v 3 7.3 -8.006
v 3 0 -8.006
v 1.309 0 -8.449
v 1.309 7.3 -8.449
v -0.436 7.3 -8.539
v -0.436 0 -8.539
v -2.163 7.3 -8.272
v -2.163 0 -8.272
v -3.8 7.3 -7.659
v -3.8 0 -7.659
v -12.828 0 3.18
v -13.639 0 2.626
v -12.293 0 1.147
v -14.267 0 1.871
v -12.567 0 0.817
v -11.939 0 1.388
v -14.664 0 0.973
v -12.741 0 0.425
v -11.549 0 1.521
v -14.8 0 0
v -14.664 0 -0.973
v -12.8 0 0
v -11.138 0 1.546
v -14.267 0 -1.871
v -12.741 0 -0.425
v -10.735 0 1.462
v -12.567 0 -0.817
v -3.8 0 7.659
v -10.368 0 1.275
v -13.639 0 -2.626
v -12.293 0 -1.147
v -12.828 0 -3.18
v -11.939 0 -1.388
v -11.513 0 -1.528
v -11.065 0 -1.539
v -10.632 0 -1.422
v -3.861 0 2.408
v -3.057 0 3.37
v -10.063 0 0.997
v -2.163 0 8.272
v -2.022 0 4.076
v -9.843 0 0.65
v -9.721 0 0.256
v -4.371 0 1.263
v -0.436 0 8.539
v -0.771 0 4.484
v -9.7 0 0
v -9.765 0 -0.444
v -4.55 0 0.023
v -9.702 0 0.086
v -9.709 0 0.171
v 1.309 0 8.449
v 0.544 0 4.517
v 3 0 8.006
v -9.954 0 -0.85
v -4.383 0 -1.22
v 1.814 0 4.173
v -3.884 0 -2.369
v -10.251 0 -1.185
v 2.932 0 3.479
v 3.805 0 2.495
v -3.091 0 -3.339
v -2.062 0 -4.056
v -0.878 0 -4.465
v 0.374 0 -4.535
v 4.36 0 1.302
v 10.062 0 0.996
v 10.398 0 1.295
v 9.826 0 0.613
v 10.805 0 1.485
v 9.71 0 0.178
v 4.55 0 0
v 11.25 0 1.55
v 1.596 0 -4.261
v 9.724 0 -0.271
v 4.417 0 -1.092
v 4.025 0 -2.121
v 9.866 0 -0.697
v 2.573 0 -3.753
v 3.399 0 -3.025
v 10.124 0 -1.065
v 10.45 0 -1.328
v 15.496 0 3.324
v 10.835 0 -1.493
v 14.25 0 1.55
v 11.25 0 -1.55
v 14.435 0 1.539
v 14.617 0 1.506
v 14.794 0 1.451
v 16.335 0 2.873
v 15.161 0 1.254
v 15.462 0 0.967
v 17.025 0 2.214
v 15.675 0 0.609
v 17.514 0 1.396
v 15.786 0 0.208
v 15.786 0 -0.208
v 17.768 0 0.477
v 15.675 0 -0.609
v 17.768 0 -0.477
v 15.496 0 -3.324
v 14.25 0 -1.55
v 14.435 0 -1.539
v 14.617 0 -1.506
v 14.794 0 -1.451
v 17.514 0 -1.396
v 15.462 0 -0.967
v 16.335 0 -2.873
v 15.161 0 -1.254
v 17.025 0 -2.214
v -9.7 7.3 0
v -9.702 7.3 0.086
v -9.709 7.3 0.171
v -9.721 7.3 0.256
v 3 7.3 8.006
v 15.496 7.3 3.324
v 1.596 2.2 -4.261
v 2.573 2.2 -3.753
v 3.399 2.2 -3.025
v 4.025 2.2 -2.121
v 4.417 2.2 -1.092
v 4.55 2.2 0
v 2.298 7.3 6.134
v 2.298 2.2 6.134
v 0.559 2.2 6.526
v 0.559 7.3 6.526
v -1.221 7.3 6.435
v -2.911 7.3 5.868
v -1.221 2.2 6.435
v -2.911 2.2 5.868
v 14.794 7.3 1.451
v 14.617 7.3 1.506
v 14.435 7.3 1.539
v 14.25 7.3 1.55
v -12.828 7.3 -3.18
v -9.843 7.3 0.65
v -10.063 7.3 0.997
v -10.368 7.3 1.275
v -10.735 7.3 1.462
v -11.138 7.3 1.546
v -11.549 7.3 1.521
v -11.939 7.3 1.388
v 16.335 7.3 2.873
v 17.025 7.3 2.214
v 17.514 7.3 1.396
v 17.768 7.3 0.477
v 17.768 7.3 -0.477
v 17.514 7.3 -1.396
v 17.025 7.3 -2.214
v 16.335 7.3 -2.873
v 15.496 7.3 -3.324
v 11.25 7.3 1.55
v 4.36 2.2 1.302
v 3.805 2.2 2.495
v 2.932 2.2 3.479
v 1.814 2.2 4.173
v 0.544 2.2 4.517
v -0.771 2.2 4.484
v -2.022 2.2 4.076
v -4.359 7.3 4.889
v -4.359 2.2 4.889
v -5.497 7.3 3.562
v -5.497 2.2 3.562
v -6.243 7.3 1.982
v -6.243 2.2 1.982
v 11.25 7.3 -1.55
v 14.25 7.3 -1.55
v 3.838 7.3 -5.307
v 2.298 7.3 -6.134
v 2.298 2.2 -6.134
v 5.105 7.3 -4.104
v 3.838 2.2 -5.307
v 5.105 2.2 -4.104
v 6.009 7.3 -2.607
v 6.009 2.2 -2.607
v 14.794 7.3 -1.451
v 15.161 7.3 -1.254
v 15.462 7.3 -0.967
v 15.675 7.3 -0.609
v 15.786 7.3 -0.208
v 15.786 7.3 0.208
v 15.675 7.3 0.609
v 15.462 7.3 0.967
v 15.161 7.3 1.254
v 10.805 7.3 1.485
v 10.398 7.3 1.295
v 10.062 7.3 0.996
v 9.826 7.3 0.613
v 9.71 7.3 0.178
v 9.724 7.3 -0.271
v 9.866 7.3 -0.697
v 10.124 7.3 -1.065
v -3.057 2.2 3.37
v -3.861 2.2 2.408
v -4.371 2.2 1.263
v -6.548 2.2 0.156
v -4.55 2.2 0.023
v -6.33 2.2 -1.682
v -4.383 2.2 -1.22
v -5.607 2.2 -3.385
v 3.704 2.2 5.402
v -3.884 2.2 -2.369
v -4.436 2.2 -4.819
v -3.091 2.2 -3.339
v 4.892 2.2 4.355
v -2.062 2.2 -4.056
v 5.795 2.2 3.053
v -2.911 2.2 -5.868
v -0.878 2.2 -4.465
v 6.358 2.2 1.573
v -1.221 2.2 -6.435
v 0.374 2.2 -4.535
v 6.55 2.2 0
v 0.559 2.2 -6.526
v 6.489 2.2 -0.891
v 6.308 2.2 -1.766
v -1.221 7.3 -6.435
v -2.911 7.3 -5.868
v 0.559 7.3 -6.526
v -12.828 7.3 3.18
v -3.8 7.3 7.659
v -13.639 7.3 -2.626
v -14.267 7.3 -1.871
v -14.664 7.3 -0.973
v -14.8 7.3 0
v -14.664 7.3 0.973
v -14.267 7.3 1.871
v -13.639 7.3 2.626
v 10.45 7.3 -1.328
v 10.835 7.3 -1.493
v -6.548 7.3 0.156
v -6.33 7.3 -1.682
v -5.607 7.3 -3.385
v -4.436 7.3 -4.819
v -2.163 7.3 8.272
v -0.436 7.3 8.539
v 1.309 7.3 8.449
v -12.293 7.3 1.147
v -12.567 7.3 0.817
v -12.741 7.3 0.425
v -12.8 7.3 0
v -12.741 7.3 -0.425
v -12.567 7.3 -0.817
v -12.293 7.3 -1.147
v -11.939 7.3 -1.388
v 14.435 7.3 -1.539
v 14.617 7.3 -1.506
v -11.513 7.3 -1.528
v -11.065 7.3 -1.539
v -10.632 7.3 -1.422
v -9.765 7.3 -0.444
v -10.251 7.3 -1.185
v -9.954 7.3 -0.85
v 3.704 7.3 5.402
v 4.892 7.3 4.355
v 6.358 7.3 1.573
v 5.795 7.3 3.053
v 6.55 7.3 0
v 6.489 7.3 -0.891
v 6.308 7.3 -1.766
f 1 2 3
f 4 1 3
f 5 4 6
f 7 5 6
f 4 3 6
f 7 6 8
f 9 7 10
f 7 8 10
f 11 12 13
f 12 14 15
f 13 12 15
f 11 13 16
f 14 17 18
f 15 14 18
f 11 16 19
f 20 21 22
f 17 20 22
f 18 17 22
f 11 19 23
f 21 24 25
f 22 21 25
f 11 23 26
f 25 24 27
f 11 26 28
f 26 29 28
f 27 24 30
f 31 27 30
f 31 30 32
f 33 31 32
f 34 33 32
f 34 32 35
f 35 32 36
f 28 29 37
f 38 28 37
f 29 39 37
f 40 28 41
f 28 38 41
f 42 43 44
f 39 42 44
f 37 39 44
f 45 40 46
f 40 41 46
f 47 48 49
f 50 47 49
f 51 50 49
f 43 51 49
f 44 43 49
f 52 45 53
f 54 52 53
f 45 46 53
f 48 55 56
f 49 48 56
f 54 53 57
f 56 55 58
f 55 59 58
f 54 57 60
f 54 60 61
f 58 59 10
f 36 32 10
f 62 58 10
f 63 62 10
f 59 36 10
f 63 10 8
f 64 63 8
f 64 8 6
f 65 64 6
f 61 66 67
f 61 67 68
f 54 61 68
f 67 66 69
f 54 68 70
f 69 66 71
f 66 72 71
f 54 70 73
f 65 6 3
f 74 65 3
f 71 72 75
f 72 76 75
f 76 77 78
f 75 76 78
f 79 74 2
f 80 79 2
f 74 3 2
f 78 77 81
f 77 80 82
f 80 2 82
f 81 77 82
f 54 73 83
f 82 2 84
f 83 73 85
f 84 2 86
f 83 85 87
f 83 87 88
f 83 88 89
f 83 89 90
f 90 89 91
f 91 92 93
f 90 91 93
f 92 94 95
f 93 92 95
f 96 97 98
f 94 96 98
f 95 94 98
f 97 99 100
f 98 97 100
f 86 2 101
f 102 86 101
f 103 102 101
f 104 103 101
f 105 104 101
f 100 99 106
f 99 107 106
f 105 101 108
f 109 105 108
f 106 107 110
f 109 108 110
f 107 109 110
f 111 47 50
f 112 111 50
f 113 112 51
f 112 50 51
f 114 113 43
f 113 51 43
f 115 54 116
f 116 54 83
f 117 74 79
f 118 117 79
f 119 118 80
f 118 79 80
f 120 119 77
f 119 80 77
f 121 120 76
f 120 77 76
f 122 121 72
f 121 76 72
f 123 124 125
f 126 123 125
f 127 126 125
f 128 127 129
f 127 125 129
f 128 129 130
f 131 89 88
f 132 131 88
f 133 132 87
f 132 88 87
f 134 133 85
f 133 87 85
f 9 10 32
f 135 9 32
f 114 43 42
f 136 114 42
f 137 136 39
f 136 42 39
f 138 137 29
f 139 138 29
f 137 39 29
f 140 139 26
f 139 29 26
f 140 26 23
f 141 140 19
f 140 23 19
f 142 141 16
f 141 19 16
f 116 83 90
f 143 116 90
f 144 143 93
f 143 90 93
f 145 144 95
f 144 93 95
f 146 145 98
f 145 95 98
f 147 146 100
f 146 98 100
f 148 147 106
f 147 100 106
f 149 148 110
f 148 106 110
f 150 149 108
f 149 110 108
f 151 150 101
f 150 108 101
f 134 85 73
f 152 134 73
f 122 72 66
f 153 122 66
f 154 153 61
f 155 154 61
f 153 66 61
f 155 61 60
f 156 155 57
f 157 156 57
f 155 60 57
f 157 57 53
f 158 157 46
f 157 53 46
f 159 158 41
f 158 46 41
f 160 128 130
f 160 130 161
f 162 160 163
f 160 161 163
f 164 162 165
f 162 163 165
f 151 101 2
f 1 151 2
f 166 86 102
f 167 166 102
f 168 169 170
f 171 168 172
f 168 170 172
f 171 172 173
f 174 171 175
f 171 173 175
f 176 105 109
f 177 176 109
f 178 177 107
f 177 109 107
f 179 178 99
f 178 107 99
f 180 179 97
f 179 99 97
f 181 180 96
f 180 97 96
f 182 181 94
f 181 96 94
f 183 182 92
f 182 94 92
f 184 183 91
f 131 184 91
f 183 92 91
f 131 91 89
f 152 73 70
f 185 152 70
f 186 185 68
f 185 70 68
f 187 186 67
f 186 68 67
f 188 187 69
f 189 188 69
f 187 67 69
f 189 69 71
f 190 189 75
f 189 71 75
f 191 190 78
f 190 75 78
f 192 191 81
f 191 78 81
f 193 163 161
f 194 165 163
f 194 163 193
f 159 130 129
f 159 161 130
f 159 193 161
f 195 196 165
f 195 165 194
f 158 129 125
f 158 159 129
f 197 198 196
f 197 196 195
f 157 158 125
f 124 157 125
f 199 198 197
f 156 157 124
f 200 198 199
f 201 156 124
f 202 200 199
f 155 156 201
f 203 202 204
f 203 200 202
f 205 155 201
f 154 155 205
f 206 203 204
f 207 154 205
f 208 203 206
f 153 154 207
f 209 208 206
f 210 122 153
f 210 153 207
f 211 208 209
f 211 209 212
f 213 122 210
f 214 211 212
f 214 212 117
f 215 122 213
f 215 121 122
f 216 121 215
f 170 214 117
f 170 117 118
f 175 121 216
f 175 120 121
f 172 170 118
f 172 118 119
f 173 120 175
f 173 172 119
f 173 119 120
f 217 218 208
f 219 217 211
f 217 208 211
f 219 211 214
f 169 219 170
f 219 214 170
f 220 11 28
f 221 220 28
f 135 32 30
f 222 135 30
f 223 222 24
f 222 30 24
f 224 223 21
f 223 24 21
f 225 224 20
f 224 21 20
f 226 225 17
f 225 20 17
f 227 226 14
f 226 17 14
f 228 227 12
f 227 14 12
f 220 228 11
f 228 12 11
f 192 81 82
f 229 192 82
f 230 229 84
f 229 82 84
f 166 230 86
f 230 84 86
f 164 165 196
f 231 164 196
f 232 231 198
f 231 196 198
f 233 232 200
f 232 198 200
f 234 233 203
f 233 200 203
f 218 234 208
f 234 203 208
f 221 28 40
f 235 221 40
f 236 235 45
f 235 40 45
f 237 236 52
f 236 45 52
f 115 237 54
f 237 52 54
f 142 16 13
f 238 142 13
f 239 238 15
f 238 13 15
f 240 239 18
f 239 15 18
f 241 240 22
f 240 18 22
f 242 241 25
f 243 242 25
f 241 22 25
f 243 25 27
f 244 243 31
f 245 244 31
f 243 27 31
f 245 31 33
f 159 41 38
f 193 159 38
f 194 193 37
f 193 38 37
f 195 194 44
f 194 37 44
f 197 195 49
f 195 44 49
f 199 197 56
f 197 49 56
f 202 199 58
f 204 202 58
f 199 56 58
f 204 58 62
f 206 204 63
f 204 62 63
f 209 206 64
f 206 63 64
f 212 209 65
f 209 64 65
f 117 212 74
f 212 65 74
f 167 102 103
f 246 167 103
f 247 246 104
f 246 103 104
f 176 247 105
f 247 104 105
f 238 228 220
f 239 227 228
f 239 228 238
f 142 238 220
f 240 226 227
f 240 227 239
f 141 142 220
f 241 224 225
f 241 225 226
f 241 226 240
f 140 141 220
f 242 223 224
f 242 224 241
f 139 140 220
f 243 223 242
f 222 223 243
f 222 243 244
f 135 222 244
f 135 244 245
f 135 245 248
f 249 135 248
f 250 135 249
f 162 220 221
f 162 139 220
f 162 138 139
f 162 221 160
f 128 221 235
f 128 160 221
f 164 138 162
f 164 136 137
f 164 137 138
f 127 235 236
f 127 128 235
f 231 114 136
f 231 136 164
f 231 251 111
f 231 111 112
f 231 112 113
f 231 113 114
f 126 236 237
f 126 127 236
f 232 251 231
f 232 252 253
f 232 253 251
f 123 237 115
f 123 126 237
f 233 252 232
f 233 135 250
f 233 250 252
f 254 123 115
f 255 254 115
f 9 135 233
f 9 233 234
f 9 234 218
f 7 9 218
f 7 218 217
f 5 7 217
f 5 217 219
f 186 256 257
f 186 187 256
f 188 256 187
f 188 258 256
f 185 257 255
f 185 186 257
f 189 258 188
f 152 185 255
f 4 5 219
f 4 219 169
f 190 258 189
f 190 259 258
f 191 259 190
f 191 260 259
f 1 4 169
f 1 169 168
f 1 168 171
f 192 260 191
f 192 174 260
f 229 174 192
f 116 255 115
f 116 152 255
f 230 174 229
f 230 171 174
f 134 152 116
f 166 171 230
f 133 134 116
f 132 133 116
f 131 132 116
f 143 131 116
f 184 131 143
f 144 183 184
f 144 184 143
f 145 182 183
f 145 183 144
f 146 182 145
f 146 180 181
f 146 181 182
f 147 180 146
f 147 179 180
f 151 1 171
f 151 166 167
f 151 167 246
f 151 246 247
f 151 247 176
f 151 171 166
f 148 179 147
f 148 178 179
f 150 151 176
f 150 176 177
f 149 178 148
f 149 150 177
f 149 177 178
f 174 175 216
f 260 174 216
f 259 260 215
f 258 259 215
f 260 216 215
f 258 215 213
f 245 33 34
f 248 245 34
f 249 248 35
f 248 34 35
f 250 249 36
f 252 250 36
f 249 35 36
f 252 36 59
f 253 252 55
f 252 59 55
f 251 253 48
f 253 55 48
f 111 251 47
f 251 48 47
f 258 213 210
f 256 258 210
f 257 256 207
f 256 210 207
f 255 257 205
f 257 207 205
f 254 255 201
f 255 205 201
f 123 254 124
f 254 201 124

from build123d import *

# Parameters (mm, degrees)
SKETCH1_R     = 6.55
SKETCH1_R_2   = 1.55
BODY_DEPTH    = 7.3
SKETCH1_4_R   = 6.55
SKETCH1_4_R_2 = 4.55
FLOOR_2_DEPTH = 2.2


with BuildPart() as part:
    # Sketch1 → Body (new body)
    with BuildSketch(Plane(origin=(0, 0, 0), x_dir=(1, 0, 0), z_dir=(0, 1, 0))):
        with BuildLine():
            ThreePointArc((15.495614035, -3.324296268), (17.8, 0), (15.495614035, 3.324296268))
            Line((15.495614035, 3.324296268), (3, 8.006403687))
            ThreePointArc((3, 8.006403687), (-0.436058681, 8.538873042), (-3.8, 7.659144861))
            Line((-3.8, 7.659144861), (-12.827777778, 3.180112778))
            ThreePointArc((-12.827777778, 3.180112778), (-14.8, 0), (-12.827777778, -3.180112778))
            Line((-12.827777778, -3.180112778), (-3.8, -7.659144861))
            ThreePointArc((-3.8, -7.659144861), (-0.436058681, -8.538873042), (3, -8.006403687))
            Line((3, -8.006403687), (15.495614035, -3.324296268))
        make_face()
        with BuildLine():
            Line((11.25, 1.55), (14.25, 1.55))
            ThreePointArc((14.25, 1.55), (15.8, 0), (14.25, -1.55))
            Line((14.25, -1.55), (11.25, -1.55))
            ThreePointArc((11.25, -1.55), (9.7, 0), (11.25, 1.55))
        make_face(mode=Mode.SUBTRACT)
        Circle(SKETCH1_R, mode=Mode.SUBTRACT)
        with Locations((-11.25, 0)):
            Circle(SKETCH1_R_2, mode=Mode.SUBTRACT)
    extrude(amount=BODY_DEPTH)

    # Sketch1<4> → Floor 2 (add)
    with BuildSketch(Plane(origin=(0, 0, 0), x_dir=(1, 0, 0), z_dir=(0, 1, 0))):
        Circle(SKETCH1_4_R)
        Circle(SKETCH1_4_R_2, mode=Mode.SUBTRACT)
    extrude(amount=FLOOR_2_DEPTH)


solid = part.part
